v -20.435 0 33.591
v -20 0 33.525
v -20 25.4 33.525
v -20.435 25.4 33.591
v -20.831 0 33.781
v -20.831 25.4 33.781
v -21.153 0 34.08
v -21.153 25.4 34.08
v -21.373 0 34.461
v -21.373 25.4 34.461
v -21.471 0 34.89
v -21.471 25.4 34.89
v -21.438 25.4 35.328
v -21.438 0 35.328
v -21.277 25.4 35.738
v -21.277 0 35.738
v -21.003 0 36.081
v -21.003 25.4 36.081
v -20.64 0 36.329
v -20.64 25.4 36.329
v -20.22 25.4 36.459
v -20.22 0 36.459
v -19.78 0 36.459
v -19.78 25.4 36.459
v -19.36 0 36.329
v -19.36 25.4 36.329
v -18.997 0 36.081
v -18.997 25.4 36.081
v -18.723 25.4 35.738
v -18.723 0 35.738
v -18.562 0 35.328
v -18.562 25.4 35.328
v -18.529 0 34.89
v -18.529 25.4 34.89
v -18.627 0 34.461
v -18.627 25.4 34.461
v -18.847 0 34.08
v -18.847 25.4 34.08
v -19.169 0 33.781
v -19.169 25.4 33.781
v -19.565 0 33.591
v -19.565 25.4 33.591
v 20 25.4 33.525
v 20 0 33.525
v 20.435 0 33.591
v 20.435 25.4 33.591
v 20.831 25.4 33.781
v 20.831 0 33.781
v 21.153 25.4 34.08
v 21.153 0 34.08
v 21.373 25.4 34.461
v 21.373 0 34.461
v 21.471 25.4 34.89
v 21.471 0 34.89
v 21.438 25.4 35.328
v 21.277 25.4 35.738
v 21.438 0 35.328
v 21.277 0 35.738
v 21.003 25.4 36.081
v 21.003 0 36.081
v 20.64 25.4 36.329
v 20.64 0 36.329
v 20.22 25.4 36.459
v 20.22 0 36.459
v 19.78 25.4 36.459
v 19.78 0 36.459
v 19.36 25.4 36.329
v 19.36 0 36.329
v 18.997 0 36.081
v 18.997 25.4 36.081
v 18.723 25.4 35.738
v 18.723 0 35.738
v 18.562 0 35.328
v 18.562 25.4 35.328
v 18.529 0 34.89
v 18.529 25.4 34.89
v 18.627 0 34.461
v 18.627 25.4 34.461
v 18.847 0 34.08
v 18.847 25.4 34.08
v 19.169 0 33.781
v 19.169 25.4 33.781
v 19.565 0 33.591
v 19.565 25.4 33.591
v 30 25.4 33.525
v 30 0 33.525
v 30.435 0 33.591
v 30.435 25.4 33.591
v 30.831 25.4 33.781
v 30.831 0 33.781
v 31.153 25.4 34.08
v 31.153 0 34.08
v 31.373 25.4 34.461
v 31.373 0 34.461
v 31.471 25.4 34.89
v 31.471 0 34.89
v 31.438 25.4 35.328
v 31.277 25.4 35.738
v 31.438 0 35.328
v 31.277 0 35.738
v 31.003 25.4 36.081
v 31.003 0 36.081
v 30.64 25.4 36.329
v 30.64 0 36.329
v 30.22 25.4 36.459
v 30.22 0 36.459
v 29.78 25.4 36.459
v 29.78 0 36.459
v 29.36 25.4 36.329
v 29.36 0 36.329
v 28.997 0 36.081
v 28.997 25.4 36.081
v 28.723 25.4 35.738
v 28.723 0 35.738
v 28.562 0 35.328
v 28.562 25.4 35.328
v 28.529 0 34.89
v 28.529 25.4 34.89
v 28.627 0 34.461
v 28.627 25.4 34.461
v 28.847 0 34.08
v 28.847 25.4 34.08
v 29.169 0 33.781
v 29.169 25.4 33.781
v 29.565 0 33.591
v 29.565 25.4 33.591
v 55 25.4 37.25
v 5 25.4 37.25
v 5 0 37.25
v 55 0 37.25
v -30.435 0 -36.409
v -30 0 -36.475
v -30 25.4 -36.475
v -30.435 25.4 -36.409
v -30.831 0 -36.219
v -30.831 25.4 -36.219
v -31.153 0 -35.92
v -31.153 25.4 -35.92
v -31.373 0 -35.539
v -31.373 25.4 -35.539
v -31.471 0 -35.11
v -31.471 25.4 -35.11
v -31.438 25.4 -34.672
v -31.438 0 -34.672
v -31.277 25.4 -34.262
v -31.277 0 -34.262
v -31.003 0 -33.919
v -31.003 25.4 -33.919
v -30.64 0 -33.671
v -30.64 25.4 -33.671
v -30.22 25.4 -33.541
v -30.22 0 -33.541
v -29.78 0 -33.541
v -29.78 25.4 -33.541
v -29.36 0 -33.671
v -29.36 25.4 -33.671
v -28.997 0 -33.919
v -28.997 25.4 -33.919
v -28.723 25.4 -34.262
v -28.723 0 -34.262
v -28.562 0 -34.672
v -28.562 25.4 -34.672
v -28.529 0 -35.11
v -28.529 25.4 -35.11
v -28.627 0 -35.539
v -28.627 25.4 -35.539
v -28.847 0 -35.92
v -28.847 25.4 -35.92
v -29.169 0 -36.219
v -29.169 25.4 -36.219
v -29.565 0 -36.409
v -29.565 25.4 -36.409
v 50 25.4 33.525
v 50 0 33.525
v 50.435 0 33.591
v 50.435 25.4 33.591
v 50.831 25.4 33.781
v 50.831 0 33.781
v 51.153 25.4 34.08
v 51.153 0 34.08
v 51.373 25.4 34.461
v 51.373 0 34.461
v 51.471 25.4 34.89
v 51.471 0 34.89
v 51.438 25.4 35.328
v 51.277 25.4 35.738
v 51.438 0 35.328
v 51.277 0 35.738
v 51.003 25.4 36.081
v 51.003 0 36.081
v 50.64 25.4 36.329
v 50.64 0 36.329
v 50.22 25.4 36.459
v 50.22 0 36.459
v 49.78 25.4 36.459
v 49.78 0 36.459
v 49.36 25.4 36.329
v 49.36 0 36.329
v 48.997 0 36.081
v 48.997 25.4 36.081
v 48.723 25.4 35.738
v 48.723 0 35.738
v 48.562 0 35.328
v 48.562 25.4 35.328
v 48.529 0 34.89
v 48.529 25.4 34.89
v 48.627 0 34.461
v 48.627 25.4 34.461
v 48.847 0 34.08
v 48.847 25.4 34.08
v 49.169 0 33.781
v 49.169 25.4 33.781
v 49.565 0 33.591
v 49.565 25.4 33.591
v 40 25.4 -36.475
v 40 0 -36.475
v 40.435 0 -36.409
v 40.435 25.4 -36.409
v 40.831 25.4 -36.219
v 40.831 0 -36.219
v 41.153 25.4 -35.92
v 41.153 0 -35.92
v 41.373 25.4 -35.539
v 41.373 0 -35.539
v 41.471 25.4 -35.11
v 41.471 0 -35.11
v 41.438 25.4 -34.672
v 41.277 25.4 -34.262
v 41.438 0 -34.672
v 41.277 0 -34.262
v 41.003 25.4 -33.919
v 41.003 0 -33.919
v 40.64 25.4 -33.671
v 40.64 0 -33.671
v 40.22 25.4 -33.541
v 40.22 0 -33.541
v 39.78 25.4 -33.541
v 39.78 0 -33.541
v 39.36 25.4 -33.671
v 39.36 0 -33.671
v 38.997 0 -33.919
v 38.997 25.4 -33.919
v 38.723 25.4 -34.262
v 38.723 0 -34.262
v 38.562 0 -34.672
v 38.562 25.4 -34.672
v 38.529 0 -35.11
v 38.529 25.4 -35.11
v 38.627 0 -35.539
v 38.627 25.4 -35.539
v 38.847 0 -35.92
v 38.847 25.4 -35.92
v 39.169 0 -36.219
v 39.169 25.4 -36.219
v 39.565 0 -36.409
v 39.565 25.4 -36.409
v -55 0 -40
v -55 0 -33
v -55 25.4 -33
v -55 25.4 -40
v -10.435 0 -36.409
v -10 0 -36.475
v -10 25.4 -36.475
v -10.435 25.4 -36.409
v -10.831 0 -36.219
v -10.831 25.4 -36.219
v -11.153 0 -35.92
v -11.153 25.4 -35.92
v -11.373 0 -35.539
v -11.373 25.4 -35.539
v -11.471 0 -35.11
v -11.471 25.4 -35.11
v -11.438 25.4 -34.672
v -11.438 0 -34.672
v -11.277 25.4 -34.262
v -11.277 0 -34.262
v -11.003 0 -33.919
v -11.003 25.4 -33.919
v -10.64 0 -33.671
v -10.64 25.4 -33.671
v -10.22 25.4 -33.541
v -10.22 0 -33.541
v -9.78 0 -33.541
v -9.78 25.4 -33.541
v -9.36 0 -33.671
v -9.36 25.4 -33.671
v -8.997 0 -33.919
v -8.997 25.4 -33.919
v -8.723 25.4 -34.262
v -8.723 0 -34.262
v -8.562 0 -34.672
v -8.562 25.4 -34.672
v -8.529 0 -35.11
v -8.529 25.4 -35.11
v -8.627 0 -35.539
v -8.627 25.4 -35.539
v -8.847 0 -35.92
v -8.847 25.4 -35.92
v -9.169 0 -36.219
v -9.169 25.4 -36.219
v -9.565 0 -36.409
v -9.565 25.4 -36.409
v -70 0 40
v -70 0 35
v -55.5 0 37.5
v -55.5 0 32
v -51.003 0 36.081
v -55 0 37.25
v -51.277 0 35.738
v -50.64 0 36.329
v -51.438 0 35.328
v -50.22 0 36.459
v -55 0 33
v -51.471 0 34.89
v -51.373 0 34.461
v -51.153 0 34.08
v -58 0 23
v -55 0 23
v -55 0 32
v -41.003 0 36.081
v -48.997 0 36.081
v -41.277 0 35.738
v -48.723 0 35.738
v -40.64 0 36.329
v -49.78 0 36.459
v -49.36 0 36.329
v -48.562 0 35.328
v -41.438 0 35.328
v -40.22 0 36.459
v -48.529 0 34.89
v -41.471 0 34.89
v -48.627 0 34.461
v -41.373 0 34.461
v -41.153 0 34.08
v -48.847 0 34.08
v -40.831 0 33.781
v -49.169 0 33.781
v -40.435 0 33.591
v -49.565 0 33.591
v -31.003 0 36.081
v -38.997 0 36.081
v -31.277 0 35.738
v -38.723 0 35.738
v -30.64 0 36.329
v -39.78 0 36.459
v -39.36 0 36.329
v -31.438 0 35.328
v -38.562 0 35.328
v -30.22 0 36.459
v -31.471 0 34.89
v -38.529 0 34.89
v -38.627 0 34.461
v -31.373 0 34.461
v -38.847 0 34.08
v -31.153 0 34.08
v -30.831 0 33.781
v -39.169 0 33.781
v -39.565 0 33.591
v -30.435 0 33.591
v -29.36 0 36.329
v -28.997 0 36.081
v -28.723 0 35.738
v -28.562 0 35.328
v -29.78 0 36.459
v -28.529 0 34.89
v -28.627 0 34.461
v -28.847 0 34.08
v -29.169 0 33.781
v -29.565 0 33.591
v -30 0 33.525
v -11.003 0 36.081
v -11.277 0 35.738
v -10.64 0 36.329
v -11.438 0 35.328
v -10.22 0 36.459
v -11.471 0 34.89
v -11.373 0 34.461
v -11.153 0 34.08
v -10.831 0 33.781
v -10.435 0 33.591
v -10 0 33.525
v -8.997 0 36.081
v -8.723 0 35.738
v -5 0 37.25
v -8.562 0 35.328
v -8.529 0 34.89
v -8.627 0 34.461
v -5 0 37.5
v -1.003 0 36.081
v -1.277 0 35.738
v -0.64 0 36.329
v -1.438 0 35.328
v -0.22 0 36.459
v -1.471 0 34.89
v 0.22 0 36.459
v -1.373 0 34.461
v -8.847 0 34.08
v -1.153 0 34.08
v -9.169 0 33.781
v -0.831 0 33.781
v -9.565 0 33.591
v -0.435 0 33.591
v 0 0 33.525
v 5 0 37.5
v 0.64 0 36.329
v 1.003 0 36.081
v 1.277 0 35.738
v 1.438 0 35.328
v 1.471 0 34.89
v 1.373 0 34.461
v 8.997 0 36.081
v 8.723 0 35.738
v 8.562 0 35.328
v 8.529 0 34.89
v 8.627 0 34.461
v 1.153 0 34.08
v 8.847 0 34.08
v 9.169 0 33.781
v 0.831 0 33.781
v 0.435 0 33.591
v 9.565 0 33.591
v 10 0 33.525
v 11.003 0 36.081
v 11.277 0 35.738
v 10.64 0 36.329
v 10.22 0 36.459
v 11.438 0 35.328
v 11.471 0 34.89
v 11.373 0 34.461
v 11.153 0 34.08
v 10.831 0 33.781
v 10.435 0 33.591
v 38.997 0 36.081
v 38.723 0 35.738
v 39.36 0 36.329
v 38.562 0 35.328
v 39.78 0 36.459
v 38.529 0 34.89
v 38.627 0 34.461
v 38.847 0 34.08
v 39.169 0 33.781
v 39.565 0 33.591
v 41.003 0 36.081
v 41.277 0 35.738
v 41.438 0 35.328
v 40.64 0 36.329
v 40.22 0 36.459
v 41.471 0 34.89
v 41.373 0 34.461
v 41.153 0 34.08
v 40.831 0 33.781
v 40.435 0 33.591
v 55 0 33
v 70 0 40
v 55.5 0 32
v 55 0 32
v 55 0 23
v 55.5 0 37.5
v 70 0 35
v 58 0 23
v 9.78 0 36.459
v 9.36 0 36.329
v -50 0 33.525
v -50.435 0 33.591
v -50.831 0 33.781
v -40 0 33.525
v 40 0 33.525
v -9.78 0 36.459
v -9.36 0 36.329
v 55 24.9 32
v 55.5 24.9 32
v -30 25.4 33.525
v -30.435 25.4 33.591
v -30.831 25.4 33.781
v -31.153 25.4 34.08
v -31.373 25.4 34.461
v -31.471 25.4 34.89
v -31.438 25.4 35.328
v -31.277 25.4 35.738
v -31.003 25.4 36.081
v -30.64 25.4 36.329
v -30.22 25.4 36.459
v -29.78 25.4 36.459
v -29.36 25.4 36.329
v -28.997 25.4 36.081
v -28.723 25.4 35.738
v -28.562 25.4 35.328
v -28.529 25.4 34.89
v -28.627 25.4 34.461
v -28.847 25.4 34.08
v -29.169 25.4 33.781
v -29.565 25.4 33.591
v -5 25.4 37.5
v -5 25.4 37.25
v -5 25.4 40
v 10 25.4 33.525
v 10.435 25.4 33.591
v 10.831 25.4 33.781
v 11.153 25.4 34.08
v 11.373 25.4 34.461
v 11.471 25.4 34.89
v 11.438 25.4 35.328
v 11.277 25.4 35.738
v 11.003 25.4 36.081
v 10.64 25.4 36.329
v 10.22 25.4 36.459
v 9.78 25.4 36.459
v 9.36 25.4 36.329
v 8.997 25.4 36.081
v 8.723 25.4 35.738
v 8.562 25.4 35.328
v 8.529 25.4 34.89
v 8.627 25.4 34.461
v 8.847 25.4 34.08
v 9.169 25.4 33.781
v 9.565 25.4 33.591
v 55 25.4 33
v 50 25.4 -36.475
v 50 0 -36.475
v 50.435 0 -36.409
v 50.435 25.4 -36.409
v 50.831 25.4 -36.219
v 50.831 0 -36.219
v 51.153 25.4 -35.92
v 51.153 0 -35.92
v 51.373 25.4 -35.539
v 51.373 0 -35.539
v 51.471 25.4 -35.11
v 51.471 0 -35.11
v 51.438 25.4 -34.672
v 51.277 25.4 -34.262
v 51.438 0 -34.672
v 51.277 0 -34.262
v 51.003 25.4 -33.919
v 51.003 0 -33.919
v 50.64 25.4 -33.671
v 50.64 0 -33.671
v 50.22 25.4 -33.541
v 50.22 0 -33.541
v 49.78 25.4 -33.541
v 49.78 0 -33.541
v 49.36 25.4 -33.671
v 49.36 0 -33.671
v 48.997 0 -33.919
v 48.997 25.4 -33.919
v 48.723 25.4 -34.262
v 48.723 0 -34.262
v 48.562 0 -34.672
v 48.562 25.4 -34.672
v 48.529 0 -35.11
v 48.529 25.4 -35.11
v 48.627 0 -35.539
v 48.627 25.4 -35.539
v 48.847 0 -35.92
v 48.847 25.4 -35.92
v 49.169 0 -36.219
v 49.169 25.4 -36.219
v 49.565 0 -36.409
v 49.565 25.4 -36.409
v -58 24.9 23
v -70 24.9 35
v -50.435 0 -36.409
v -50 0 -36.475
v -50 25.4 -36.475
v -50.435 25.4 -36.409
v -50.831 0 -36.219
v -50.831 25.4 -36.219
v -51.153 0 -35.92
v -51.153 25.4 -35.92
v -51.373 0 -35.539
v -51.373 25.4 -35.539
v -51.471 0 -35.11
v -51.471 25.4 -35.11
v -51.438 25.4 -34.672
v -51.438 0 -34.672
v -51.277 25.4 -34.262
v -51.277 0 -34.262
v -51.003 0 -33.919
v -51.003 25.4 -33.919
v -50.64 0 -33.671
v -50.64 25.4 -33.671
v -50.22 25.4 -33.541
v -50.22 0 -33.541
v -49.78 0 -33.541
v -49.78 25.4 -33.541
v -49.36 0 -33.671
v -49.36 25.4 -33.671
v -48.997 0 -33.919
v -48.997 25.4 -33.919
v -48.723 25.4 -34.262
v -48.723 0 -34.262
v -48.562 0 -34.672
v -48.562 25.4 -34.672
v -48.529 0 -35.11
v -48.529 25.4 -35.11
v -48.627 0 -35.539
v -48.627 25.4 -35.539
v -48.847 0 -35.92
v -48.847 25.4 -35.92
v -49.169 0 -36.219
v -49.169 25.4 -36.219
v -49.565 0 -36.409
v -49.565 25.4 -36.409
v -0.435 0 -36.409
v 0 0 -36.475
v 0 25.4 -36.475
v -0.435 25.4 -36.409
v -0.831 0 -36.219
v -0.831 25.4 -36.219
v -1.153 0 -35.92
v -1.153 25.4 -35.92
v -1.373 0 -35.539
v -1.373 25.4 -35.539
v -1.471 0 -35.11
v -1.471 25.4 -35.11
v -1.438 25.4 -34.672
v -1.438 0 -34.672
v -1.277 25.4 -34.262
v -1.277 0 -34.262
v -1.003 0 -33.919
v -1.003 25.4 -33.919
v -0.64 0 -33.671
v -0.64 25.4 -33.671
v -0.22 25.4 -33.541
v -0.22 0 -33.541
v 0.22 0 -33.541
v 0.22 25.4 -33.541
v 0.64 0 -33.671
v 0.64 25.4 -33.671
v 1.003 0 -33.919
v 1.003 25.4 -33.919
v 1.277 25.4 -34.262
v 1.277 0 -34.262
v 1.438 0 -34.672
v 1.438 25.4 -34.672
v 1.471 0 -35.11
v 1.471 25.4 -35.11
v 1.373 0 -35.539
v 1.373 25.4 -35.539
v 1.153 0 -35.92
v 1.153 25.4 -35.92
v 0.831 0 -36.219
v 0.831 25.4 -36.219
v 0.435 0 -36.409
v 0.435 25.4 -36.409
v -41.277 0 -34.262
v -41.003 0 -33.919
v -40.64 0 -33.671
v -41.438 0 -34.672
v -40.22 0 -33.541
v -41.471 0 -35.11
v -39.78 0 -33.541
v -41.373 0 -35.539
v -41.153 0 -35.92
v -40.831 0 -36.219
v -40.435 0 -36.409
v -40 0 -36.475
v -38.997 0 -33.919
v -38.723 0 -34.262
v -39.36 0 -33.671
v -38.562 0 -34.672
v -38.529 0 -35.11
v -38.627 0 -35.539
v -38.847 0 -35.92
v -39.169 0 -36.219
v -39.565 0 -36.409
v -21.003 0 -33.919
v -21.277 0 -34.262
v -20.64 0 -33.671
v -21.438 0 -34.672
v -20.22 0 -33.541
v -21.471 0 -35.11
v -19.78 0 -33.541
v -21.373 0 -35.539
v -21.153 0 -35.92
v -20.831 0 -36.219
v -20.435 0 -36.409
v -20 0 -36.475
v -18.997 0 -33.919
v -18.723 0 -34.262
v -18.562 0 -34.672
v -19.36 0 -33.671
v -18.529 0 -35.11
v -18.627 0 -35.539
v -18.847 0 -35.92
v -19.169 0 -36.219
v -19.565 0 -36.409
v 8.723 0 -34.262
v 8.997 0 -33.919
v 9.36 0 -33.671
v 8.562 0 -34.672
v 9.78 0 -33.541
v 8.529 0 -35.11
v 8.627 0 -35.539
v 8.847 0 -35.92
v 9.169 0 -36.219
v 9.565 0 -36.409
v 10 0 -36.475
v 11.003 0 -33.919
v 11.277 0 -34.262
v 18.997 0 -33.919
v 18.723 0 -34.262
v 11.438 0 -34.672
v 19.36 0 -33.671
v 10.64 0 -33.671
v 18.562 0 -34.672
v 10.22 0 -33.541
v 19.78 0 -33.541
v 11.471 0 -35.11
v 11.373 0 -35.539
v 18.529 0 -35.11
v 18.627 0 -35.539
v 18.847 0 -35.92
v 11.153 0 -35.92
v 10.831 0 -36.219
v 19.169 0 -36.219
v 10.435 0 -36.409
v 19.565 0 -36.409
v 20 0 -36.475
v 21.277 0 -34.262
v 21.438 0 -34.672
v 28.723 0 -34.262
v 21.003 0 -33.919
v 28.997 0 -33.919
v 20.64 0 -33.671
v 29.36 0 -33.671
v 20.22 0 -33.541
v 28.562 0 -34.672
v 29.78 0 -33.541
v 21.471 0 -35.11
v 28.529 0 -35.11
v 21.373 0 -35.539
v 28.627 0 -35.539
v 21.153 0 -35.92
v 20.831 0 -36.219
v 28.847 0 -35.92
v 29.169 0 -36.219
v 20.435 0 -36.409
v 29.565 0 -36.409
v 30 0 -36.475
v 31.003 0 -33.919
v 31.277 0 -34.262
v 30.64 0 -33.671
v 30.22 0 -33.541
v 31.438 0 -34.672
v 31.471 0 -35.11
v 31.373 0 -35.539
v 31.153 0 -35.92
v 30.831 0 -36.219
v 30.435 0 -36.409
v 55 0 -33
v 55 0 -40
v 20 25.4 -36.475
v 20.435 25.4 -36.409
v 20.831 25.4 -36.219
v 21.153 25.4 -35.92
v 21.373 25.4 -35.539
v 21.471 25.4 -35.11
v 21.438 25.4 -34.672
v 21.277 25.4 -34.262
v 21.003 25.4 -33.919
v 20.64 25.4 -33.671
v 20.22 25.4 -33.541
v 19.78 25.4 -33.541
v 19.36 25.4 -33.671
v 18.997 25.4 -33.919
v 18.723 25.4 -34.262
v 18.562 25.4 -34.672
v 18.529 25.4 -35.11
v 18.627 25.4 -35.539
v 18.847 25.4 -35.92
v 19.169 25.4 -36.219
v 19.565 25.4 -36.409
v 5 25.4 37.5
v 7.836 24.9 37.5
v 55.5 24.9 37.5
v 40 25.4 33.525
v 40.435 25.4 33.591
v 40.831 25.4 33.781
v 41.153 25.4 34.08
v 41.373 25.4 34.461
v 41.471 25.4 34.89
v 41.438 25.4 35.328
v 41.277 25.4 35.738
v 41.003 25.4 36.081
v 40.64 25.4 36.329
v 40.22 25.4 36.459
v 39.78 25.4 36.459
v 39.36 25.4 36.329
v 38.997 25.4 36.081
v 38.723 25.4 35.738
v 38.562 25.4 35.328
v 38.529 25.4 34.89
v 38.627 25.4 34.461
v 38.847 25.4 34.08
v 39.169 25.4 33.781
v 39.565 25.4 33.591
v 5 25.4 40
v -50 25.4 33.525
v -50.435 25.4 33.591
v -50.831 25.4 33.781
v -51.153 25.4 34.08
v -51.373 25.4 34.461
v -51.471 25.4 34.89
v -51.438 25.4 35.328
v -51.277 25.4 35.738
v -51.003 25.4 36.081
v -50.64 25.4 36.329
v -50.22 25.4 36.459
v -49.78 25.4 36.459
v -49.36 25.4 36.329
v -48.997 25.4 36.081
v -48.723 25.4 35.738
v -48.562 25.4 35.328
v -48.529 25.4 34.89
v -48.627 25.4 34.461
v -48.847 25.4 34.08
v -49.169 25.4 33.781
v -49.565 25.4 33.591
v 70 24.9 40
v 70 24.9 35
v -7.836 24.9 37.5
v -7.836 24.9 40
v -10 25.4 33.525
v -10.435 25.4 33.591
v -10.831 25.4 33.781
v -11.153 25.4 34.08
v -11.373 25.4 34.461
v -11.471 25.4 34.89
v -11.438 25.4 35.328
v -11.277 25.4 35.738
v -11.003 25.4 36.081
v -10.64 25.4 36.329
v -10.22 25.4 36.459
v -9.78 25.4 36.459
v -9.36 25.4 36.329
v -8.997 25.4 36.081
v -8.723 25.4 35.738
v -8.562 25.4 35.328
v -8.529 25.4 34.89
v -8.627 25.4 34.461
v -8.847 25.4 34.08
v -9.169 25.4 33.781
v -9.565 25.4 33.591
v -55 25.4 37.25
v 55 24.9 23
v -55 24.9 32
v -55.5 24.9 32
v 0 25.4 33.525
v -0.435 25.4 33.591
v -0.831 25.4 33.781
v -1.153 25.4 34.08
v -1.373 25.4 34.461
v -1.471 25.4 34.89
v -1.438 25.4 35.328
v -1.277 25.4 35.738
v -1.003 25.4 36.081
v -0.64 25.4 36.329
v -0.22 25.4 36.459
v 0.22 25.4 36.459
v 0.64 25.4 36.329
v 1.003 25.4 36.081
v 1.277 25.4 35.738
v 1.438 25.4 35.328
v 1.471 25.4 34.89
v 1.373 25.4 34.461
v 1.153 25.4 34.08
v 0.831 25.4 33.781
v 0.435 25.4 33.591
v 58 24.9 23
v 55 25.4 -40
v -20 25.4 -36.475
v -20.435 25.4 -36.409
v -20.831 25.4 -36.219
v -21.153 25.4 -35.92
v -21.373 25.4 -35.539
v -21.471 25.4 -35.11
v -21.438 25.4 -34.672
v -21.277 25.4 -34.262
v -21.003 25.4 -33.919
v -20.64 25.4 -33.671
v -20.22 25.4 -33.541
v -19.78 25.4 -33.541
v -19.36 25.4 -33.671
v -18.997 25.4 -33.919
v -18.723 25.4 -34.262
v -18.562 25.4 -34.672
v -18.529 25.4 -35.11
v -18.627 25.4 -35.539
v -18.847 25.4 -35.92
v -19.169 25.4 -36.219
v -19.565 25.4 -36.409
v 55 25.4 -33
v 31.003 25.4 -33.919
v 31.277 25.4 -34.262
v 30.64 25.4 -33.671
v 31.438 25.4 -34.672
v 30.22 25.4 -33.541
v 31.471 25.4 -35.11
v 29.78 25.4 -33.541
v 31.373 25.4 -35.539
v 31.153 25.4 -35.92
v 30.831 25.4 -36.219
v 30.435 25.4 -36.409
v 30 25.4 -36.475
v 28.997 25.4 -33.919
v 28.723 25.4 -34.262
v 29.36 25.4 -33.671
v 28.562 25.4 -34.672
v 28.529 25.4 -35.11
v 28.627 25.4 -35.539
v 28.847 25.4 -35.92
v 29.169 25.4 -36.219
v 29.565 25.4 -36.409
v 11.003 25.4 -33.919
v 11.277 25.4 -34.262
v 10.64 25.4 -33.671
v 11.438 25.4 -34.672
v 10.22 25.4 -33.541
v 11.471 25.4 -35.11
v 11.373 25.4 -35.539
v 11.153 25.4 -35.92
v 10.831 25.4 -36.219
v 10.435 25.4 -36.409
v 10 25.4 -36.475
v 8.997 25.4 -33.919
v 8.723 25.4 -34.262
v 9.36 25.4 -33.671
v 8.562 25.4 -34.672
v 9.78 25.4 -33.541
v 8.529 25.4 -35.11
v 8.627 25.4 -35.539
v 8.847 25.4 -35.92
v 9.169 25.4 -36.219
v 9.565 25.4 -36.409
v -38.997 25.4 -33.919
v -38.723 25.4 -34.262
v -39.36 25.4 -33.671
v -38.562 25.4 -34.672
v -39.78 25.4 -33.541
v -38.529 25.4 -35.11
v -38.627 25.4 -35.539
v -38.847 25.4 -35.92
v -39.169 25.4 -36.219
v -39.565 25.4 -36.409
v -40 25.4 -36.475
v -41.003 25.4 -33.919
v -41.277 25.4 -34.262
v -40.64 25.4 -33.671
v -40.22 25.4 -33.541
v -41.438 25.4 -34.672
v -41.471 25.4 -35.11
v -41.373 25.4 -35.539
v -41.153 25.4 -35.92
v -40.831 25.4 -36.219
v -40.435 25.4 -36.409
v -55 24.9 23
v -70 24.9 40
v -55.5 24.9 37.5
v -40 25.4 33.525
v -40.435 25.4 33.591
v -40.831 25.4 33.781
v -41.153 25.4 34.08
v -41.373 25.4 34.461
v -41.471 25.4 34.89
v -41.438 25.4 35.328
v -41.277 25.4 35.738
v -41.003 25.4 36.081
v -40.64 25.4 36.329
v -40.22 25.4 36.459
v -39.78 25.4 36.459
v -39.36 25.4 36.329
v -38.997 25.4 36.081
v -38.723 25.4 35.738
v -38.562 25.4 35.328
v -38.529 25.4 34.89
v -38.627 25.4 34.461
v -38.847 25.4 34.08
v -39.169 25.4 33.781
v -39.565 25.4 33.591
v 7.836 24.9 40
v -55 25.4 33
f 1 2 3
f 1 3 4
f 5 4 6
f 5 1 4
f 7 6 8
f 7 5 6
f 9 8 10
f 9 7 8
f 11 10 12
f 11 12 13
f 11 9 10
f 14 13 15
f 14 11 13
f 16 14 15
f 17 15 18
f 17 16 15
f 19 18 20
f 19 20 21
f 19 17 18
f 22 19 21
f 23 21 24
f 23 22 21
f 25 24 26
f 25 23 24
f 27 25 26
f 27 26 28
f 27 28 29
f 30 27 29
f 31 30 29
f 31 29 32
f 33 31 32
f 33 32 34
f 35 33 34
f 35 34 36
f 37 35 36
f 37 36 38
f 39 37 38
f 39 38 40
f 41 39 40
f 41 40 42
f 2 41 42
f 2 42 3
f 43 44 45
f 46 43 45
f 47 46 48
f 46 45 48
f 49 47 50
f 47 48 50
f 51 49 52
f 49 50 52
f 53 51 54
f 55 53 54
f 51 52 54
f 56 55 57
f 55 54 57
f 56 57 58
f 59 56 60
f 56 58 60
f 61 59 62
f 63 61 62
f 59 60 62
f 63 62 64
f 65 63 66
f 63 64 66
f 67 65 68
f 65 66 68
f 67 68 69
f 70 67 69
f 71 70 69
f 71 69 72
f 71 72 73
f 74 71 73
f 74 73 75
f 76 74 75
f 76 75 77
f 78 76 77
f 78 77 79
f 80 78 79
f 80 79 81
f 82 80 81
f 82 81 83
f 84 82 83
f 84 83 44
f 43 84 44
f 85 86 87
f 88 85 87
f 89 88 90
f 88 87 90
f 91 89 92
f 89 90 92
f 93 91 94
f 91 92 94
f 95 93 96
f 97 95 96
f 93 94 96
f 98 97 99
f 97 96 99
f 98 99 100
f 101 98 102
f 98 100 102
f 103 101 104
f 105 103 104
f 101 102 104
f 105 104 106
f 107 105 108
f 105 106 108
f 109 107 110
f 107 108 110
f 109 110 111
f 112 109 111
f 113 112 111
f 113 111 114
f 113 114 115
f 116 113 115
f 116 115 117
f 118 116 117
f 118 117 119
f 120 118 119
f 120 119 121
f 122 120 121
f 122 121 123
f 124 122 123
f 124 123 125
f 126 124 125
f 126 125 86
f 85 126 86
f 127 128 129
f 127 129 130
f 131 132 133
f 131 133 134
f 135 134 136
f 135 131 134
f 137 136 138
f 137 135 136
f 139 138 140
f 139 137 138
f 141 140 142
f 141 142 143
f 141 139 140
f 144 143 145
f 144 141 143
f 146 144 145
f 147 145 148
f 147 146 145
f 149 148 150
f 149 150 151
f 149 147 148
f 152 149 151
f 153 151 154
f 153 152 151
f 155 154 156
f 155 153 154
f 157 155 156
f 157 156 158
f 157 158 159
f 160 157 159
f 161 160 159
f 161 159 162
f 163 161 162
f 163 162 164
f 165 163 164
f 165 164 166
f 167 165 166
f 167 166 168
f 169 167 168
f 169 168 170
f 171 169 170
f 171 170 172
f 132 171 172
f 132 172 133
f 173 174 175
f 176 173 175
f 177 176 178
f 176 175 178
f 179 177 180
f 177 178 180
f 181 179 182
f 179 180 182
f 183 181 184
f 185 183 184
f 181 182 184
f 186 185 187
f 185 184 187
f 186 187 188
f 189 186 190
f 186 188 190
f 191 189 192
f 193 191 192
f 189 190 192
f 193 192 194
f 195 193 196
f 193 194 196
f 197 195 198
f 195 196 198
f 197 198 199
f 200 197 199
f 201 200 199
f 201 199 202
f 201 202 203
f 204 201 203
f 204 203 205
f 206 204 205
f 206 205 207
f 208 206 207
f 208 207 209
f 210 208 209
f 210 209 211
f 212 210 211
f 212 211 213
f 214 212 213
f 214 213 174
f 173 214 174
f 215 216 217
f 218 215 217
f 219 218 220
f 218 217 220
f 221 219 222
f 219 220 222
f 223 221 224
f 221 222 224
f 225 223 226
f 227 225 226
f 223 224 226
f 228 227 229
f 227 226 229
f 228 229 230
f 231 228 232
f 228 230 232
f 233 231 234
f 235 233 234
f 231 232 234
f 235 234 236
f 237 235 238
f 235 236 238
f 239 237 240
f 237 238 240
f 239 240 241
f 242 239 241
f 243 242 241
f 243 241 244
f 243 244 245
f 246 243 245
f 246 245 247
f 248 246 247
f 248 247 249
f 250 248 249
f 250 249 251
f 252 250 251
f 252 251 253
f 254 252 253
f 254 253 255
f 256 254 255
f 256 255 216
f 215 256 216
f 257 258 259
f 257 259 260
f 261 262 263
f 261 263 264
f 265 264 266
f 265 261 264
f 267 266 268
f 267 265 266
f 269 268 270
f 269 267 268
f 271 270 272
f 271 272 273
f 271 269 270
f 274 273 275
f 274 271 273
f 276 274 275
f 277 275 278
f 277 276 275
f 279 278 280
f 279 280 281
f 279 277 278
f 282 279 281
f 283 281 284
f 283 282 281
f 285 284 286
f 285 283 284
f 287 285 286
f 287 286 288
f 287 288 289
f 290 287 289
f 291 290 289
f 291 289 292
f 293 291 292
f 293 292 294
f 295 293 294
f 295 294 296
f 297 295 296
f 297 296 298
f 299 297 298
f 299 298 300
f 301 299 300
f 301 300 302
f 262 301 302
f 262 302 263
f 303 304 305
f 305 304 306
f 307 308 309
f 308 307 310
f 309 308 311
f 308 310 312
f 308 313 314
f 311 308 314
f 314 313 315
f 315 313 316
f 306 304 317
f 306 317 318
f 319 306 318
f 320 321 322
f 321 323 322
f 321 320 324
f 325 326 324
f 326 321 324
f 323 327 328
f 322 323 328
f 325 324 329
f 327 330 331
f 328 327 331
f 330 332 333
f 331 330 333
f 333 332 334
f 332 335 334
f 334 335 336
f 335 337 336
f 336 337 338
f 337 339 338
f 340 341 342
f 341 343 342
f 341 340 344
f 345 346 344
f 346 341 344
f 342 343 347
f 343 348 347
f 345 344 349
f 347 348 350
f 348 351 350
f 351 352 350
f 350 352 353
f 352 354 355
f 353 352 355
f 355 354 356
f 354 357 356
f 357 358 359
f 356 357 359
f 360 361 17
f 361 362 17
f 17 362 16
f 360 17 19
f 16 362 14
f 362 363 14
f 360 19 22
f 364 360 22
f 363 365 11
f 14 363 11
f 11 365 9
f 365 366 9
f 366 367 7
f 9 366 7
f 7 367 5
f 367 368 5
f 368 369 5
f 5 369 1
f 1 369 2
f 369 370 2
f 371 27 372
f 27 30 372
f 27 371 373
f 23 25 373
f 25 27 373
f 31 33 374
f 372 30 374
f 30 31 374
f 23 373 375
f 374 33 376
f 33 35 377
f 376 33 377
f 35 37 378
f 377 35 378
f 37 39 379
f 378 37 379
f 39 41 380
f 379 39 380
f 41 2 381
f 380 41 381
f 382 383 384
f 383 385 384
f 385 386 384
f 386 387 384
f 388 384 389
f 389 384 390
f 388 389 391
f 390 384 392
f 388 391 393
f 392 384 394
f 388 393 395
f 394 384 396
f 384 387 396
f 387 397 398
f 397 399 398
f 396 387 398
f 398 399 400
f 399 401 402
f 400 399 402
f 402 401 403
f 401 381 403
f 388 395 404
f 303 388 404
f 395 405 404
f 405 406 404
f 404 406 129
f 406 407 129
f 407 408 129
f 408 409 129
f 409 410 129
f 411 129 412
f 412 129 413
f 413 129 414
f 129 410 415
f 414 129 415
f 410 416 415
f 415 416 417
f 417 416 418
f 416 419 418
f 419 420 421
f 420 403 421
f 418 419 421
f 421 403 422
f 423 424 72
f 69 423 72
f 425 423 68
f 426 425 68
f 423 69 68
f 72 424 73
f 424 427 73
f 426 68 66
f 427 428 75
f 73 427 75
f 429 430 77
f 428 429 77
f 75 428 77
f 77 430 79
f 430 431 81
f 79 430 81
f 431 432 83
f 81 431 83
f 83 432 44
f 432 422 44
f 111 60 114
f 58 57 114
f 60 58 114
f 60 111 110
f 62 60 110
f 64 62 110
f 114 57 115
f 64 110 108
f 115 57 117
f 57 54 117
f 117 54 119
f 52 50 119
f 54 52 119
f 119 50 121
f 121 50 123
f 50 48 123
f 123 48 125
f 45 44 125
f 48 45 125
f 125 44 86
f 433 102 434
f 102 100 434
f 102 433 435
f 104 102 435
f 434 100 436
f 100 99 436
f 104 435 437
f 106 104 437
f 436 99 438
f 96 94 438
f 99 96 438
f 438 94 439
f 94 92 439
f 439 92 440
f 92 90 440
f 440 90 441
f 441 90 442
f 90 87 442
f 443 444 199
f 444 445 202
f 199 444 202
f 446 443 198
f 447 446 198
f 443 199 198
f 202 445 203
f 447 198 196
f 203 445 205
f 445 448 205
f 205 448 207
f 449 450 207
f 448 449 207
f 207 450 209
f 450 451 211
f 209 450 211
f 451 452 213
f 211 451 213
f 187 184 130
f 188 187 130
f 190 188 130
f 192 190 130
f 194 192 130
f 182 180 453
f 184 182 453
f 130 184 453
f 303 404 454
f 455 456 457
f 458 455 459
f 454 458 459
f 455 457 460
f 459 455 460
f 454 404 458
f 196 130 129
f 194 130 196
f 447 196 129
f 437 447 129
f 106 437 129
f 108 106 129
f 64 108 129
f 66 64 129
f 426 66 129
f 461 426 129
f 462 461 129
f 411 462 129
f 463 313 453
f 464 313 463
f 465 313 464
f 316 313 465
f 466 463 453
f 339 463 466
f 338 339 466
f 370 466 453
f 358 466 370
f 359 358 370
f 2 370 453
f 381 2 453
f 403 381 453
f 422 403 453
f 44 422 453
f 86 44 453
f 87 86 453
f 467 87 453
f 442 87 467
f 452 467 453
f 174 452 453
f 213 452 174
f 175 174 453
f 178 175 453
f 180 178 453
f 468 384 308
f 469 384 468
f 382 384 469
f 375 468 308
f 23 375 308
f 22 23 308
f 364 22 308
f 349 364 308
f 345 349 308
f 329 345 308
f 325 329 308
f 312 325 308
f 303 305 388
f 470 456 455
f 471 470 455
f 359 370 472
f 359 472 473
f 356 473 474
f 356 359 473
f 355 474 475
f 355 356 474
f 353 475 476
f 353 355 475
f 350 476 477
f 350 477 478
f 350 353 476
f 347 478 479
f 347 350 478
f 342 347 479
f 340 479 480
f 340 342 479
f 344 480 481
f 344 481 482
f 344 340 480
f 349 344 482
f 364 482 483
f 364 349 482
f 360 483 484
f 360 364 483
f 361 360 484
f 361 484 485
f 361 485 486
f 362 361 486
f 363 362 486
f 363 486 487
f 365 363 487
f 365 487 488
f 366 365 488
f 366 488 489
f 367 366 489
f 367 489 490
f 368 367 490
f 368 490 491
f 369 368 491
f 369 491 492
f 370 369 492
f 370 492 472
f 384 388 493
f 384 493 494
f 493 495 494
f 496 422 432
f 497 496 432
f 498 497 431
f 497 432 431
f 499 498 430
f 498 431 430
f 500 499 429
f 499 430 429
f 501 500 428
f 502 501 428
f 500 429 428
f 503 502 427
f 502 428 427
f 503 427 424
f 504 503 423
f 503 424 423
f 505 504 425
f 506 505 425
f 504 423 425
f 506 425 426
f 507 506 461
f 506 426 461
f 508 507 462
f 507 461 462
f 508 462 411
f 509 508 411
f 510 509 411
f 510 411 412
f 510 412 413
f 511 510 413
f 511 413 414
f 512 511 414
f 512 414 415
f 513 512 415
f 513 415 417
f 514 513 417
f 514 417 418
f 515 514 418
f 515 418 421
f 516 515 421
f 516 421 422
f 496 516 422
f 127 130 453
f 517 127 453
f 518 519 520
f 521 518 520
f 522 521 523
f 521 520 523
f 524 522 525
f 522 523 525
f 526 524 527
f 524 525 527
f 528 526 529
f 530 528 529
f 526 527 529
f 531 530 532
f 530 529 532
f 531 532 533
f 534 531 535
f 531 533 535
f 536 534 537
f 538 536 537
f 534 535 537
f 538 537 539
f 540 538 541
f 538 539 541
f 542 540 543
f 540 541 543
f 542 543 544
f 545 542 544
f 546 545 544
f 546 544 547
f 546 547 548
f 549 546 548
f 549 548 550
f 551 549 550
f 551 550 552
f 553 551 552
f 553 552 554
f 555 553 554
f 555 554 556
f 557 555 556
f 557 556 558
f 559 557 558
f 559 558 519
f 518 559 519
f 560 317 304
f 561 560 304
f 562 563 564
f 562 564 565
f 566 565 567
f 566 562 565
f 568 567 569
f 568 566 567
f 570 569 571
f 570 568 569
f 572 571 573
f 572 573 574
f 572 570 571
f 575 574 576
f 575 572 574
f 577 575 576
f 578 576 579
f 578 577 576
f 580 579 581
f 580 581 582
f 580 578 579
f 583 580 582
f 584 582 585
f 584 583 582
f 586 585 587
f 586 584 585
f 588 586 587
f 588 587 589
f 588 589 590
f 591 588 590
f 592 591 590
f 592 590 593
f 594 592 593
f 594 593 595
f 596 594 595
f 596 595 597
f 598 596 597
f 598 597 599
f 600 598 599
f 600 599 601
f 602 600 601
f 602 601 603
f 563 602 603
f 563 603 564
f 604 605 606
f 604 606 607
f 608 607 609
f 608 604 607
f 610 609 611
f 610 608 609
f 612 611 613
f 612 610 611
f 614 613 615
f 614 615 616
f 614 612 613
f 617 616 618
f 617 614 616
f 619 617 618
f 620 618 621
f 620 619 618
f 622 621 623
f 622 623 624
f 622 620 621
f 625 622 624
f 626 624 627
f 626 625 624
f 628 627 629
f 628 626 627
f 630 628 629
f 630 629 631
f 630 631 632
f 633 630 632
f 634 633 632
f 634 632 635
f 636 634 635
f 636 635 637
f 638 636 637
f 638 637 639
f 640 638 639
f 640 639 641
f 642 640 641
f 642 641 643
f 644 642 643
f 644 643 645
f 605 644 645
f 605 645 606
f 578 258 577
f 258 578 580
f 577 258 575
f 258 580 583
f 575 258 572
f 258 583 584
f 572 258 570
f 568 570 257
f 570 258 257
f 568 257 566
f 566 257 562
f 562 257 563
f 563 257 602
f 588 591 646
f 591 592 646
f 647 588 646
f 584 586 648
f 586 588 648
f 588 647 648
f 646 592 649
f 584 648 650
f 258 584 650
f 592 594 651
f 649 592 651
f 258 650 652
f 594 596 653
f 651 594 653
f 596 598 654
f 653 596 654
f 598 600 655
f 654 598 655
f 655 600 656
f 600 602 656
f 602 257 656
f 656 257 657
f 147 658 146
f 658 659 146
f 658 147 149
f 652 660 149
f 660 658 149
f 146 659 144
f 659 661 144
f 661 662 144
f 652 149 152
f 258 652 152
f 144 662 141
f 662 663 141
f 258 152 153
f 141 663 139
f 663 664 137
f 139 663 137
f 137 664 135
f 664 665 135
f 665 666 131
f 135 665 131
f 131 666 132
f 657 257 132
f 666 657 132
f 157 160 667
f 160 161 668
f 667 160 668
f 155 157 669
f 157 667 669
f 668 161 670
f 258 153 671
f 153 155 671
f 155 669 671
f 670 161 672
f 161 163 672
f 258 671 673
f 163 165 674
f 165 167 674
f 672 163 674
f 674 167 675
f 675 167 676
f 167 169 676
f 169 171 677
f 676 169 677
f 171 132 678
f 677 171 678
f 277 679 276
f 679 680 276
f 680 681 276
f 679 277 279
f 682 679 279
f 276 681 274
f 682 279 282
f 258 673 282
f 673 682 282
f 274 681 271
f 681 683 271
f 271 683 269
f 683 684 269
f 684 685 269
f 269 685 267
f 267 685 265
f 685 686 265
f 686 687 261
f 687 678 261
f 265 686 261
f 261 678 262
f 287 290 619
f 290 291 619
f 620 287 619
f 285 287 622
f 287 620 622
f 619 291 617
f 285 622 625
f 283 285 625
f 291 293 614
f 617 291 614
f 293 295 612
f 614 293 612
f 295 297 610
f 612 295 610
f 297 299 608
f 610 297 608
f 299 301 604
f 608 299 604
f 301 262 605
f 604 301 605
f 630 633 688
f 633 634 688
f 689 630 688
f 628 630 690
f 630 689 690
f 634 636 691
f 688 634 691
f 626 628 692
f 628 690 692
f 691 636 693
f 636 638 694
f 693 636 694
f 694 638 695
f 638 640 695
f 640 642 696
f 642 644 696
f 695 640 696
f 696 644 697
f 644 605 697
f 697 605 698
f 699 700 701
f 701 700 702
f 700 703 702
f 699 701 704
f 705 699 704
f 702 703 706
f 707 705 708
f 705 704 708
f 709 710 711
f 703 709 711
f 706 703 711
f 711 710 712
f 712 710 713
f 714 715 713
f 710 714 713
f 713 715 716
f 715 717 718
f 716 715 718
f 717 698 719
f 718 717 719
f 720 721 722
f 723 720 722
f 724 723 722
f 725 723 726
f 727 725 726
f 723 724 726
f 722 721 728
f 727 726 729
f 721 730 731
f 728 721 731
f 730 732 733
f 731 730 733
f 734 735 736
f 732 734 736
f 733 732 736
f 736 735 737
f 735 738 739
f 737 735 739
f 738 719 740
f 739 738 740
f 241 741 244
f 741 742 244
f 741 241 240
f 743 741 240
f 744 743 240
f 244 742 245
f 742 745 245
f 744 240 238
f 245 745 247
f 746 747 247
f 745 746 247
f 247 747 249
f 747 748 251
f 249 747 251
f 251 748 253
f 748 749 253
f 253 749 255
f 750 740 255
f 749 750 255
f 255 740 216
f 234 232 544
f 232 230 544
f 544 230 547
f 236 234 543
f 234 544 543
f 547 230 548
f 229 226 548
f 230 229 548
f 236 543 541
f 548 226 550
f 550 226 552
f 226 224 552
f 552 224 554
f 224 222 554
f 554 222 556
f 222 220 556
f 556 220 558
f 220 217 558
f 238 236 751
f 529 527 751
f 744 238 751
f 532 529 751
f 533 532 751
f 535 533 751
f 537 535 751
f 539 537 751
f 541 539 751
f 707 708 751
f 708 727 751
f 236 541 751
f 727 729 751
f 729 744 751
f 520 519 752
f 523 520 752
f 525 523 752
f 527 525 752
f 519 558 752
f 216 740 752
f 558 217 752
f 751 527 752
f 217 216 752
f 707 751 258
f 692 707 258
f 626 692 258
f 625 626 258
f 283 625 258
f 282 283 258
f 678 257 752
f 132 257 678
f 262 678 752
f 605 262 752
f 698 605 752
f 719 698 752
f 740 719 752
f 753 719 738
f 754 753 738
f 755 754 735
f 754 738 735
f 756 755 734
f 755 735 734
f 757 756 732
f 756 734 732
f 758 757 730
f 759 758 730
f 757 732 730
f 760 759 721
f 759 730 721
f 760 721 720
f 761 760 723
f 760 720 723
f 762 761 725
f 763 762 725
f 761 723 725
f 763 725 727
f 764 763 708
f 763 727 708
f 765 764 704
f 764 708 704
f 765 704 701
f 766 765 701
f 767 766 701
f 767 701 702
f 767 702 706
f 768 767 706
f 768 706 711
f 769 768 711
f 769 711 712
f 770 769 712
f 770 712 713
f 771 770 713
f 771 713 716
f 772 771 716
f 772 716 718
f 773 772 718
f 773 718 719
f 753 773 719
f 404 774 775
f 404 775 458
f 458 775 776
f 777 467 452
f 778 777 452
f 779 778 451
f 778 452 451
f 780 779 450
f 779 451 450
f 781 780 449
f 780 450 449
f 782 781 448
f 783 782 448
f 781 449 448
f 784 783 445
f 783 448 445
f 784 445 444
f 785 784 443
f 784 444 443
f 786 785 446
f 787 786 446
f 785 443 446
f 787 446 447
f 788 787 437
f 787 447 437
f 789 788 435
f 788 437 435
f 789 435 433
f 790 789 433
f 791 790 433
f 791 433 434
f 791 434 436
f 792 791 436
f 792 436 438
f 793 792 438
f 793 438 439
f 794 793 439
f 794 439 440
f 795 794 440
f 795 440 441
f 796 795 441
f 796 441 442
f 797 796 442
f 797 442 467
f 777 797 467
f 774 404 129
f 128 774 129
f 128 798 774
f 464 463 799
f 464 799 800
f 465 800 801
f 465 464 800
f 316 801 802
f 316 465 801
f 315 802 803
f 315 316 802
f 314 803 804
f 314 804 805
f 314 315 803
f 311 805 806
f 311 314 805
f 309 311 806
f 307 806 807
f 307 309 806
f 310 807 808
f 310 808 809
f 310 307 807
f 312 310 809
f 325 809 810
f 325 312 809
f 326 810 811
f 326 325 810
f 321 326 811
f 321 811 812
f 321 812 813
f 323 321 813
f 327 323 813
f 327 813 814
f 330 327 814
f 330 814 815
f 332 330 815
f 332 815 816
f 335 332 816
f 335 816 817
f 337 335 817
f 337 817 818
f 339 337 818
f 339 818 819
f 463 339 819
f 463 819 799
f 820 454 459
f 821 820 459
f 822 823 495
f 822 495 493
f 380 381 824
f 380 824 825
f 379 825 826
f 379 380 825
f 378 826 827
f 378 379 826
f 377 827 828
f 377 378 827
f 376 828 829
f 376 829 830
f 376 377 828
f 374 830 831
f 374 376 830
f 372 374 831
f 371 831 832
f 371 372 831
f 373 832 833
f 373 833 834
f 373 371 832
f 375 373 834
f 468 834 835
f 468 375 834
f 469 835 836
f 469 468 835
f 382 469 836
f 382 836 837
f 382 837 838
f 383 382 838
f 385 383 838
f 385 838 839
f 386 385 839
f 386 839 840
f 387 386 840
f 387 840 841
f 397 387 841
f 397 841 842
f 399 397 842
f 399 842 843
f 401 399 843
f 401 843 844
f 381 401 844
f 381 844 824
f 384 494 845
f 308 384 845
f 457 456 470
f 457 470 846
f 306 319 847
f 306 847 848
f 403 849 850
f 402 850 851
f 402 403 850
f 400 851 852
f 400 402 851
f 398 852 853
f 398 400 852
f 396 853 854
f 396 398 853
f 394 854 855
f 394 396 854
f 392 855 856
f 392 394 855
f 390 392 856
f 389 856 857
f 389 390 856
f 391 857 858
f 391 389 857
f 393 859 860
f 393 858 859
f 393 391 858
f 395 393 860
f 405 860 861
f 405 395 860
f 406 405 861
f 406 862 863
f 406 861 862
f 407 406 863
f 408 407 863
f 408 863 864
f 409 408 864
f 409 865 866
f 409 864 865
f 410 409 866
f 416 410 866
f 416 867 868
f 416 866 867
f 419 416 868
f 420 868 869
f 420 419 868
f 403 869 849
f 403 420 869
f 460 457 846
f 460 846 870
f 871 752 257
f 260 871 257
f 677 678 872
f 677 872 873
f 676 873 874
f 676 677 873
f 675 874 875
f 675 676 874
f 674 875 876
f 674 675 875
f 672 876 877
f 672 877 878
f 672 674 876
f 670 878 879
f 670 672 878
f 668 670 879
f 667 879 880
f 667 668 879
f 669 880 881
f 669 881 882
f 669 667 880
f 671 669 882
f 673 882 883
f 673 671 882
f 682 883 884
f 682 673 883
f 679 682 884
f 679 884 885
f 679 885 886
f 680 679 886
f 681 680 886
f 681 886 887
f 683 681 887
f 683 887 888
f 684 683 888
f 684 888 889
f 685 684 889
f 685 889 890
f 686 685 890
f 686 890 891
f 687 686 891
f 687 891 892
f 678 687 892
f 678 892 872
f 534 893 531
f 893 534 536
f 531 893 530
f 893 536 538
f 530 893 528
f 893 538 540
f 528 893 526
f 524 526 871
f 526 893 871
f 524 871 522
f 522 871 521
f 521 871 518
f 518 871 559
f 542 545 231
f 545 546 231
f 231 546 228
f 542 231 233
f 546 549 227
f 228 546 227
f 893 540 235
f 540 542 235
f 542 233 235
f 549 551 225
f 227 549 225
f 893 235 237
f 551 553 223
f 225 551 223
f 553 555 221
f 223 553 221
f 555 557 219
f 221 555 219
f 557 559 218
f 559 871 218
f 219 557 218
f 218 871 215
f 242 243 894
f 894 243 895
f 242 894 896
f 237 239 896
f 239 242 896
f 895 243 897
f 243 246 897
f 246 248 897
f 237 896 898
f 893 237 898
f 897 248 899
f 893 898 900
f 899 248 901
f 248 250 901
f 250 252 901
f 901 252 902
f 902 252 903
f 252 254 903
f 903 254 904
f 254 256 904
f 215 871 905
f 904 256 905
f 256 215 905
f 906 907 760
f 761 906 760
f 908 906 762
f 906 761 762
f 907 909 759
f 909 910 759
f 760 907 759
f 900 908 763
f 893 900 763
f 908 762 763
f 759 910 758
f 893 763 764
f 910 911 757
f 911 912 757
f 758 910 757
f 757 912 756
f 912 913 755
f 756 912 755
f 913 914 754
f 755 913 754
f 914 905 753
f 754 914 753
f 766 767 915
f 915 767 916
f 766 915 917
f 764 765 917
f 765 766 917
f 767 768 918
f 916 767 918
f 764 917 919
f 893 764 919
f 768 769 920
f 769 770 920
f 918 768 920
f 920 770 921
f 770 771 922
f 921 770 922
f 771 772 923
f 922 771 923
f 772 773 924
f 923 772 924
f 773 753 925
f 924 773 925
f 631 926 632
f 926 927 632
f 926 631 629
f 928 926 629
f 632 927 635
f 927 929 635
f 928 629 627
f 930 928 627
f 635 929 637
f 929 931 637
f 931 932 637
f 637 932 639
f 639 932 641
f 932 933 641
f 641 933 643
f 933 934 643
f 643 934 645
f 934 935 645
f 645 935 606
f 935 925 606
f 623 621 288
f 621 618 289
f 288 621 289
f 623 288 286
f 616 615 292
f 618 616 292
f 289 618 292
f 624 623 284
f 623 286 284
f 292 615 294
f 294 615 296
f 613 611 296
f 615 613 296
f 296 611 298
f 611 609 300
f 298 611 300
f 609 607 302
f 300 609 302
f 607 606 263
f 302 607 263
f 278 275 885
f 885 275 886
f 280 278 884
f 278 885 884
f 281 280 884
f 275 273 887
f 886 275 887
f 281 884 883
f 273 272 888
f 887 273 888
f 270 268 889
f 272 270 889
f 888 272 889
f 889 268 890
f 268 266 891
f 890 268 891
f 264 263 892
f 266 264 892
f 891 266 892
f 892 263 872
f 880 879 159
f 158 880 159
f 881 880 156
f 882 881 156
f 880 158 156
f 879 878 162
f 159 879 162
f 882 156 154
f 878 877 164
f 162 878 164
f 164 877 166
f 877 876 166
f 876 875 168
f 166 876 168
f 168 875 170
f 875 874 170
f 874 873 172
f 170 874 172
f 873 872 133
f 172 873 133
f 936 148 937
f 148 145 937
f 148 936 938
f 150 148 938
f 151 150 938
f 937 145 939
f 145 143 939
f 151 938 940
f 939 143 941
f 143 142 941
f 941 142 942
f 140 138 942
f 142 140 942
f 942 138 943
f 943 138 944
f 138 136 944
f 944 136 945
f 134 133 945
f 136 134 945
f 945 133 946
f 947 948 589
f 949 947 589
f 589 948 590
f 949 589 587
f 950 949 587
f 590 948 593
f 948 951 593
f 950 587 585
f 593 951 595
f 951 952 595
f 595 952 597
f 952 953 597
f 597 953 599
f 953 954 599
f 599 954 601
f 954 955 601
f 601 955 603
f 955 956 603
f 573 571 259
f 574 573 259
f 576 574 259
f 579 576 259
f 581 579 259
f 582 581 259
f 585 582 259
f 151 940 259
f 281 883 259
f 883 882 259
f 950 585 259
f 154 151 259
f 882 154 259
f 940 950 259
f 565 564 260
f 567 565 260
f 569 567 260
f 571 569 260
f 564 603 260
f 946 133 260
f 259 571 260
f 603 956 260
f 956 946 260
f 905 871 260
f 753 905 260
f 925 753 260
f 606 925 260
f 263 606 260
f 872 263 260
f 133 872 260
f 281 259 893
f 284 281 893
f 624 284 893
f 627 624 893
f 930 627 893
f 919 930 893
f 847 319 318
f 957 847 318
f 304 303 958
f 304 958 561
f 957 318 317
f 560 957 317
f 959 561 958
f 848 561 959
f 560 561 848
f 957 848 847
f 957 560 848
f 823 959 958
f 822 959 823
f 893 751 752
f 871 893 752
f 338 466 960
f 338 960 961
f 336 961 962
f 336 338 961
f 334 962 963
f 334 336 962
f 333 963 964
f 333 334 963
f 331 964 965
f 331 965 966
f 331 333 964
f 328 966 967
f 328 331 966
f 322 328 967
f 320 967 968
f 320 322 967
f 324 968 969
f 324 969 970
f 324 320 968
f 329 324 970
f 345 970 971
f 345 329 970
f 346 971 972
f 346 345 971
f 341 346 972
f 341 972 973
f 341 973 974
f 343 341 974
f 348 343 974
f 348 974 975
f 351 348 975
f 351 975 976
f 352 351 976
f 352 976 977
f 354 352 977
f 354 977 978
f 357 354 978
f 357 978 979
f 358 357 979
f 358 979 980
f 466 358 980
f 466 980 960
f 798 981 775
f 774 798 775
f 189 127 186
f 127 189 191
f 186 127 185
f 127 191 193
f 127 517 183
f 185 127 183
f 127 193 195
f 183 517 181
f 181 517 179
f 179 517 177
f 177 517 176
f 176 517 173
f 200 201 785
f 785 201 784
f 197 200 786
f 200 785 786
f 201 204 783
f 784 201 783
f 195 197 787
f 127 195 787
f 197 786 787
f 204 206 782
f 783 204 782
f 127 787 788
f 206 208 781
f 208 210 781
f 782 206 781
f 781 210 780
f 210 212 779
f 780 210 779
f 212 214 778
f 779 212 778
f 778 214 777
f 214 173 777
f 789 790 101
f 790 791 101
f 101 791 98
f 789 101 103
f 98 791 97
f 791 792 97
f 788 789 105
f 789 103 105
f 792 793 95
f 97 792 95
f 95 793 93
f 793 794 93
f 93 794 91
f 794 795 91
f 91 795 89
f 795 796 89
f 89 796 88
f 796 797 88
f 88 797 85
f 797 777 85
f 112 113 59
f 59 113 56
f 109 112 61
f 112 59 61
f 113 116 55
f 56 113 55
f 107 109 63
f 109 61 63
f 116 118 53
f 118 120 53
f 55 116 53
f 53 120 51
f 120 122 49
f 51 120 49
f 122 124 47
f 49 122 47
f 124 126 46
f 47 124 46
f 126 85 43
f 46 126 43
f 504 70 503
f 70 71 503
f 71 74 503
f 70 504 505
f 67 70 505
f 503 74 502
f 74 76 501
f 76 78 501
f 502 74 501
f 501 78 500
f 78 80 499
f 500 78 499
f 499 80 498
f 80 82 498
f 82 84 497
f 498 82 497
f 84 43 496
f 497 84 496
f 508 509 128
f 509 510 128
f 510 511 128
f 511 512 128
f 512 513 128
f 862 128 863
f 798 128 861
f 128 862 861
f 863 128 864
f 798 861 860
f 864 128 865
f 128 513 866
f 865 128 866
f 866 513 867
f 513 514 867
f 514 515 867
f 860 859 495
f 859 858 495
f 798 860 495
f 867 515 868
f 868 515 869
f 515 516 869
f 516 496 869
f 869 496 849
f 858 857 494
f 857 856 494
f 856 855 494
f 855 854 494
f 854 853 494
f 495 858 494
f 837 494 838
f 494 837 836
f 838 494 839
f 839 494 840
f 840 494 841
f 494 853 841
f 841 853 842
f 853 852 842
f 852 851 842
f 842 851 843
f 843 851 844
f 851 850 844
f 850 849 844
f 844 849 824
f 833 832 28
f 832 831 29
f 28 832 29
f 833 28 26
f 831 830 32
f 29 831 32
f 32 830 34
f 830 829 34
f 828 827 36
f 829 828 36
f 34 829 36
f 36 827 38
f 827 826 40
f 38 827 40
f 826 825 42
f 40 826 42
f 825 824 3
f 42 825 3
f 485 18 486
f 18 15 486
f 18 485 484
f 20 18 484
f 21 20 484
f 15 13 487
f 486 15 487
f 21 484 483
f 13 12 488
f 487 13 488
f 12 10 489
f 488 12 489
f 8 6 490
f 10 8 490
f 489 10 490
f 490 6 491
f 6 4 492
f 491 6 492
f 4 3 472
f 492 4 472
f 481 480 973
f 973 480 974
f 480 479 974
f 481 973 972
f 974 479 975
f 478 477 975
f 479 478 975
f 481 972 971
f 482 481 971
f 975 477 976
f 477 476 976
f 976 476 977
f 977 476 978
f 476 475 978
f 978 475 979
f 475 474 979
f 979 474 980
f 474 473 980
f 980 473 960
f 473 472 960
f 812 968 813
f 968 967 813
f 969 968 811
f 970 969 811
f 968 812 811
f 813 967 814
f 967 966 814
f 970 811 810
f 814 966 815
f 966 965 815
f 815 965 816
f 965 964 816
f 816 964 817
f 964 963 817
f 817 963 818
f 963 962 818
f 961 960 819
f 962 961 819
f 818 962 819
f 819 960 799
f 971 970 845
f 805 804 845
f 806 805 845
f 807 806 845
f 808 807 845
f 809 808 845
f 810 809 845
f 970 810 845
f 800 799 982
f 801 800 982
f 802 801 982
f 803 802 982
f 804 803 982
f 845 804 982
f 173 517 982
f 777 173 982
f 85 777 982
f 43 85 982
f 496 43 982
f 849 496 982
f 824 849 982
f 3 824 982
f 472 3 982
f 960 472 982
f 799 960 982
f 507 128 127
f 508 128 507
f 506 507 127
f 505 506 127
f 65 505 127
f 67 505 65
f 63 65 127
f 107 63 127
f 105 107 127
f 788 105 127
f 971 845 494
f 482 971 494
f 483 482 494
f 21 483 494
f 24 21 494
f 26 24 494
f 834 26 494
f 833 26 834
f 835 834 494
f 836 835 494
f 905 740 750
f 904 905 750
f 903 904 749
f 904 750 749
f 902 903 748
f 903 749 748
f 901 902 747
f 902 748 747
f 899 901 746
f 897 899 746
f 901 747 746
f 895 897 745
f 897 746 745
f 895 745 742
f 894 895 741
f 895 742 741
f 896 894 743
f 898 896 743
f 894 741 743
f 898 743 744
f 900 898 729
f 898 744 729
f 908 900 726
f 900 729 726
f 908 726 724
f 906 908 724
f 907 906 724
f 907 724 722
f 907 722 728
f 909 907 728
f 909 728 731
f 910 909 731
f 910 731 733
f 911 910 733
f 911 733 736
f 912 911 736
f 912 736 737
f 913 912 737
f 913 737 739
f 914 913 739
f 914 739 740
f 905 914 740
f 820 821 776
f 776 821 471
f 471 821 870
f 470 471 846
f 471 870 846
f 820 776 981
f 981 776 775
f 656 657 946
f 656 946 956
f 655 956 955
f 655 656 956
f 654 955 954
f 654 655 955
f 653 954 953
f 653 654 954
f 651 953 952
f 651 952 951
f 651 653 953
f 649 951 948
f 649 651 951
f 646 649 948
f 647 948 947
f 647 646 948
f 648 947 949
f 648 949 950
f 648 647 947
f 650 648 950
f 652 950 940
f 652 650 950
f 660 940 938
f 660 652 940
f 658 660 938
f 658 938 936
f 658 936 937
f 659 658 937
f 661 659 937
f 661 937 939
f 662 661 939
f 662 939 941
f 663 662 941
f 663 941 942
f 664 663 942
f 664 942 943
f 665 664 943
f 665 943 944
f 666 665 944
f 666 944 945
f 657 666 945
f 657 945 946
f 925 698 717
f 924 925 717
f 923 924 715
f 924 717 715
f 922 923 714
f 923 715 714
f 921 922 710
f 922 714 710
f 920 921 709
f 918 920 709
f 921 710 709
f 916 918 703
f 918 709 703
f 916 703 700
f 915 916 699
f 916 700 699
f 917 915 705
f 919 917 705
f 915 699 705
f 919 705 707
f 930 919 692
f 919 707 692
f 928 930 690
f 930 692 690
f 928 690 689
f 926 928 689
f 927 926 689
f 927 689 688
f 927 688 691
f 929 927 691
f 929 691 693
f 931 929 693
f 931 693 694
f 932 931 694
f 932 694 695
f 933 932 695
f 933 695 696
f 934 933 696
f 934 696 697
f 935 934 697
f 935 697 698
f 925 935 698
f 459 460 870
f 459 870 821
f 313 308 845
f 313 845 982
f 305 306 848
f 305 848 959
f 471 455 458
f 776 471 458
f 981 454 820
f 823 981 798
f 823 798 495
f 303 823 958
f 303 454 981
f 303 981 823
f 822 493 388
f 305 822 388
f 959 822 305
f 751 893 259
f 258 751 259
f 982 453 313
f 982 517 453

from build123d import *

# Parameters (mm, degrees)
SKETCH1_W           = 110
SKETCH1_H           = 80
BOSS_EXTRUDE1_DEPTH = 25.4
SKETCH2_W           = 66
SKETCH2_H           = 24
CUT_EXTRUDE1_DEPTH  = 120.771282034
SKETCH3_R           = 1.475
CUT_EXTRUDE2_DEPTH  = 73.595867651
LPATTERN1_COUNT     = 6
LPATTERN1_PITCH     = 10
LPATTERN1_COL_COUNT = 6
LPATTERN1_COL_PITCH = 10
BOSS_EXTRUDE2_DEPTH = 24.9
SKETCH11_W          = 10
SKETCH11_H          = 66
CUT_EXTRUDE7_DEPTH  = 75.431176264
SKETCH12_W          = 0.5
SKETCH12_H          = 9
BOSS_EXTRUDE5_DEPTH = 24.9
SKETCH5_W           = 50
SKETCH5_H           = 0.25
CUT_EXTRUDE3_DEPTH  = 75.894325553
SKETCH6_W           = 50
SKETCH6_H           = 2.5
CUT_EXTRUDE4_DEPTH  = 0.5
SKETCH7_W           = 12
SKETCH7_H           = 5
BOSS_EXTRUDE3_DEPTH = 24.9
BOSS_EXTRUDE4_DEPTH = 24.9
CHAMFER1_SIZE2      = 2.83564091
CHAMFER1_SIZE       = 0.5
SKETCH9_W           = 55
SKETCH9_H           = 80
CUT_EXTRUDE5_DEPTH  = 85.529048262
SKETCH10_W          = 90
SKETCH10_H          = 66
CUT_EXTRUDE6_DEPTH  = 85.118963379


with BuildPart() as part:
    # Sketch1 → Boss-Extrude1 (new body)
    with BuildSketch(Plane(origin=(0, 0, 0), x_dir=(1, 0, 0), z_dir=(0, 1, 0))):
        Rectangle(SKETCH1_W, SKETCH1_H)
    extrude(amount=BOSS_EXTRUDE1_DEPTH)

    # Sketch2 → Cut-Extrude1 (cut, through all)
    with BuildSketch(Plane(origin=(55, 0, 0), x_dir=(0, 0, -1), z_dir=(1, 0, 0))):
        with Locations((0, 13.4)):
            Rectangle(SKETCH2_W, SKETCH2_H)
    extrude(amount=-CUT_EXTRUDE1_DEPTH, mode=Mode.SUBTRACT)

    # Sketch3 → Cut-Extrude2 (cut, through all)
    with BuildSketch(Plane.XZ):
        with Locations(Location((0, 35, 0), (0, 0, 270))):
            Circle(SKETCH3_R)
        with Locations(Location((0, -35, 0), (0, 0, 270))):
            Circle(SKETCH3_R)
    cut_extrude2 = extrude(amount=-CUT_EXTRUDE2_DEPTH, mode=Mode.SUBTRACT)

    # LPattern1: Cut-Extrude2 ×6
    with Locations(*[(i * LPATTERN1_PITCH, 0, 0) for i in range(1, LPATTERN1_COUNT)]):
        add(cut_extrude2, mode=Mode.SUBTRACT)

    # LPattern1 col: Cut-Extrude2 ×6
    with Locations(*[(-i * LPATTERN1_COL_PITCH, 0, 0) for i in range(1, LPATTERN1_COL_COUNT)]):
        add(cut_extrude2, mode=Mode.SUBTRACT)

    # Sketch4 → Boss-Extrude2 (add)
    with BuildSketch(Plane(origin=(0, 0, 0), x_dir=(1, 0, 0), z_dir=(0, 1, 0))):
        Polygon((55, -40), (58, -40), (58, -37.5), (58, -23), (55.5, -23), (55.5, -37.5), (55, -37.5), align=None)
    extrude(amount=BOSS_EXTRUDE2_DEPTH)

    # Sketch11 → Cut-Extrude7 (cut, through all)
    with BuildSketch(Plane(origin=(0, 1.4, 0), x_dir=(1, 0, 0), z_dir=(0, 1, 0))):
        with Locations((50, 0)):
            Rectangle(SKETCH11_W, SKETCH11_H)
    extrude(amount=-CUT_EXTRUDE7_DEPTH, mode=Mode.SUBTRACT)

    # Sketch12 → Boss-Extrude5 (add)
    with BuildSketch(Plane(origin=(0, 0, 0), x_dir=(1, 0, 0), z_dir=(0, 1, 0))):
        with Locations((55.25, -27.5)):
            Rectangle(SKETCH12_W, SKETCH12_H)
    extrude(amount=BOSS_EXTRUDE5_DEPTH)

    # Sketch5 → Cut-Extrude3 (cut, through all)
    with BuildSketch(Plane(origin=(0, 25.4, 0), x_dir=(1, 0, 0), z_dir=(0, 1, 0))):
        with Locations((30, -37.375)):
            Rectangle(SKETCH5_W, SKETCH5_H)
    extrude(amount=-CUT_EXTRUDE3_DEPTH, mode=Mode.SUBTRACT)

    # Sketch6 → Cut-Extrude4 (cut)
    with BuildSketch(Plane(origin=(0, 25.4, 0), x_dir=(1, 0, 0), z_dir=(0, 1, 0))):
        with Locations((30, -38.75)):
            Rectangle(SKETCH6_W, SKETCH6_H)
    extrude(amount=-CUT_EXTRUDE4_DEPTH, mode=Mode.SUBTRACT)

    # Sketch7 → Boss-Extrude3 (add)
    with BuildSketch(Plane(origin=(0, 0, 0), x_dir=(1, 0, 0), z_dir=(0, 1, 0))):
        with Locations((64, -37.5)):
            Rectangle(SKETCH7_W, SKETCH7_H)
    extrude(amount=BOSS_EXTRUDE3_DEPTH)

    # Sketch8 → Boss-Extrude4 (add)
    with BuildSketch(Plane(origin=(0, 0, 0), x_dir=(1, 0, 0), z_dir=(0, 1, 0))):
        Polygon((58, -23), (70, -35), (58, -35), align=None)
    extrude(amount=BOSS_EXTRUDE4_DEPTH)

    # Chamfer1
    chamfer1_edges = [part.edges().sort_by_distance(p)[0] for p in [
        (5, 24.9, 38.75),
    ]]
    chamfer1_side = [part.faces().sort_by_distance(p)[0] for p in [
        (5, 24.91, 38.75),
    ]]
    chamfer(chamfer1_edges, length=CHAMFER1_SIZE - 0.0001, length2=CHAMFER1_SIZE2 - 0.0001, reference=chamfer1_side[0])  # a hair under: the kernel refuses the full size

    # Sketch9 → Cut-Extrude5 (cut, through all)
    with BuildSketch(Plane(origin=(0, 25.4, 0), x_dir=(1, 0, 0), z_dir=(0, 1, 0))):
        with Locations((-27.5, 0)):
            Rectangle(SKETCH9_W, SKETCH9_H)
    extrude(amount=-CUT_EXTRUDE5_DEPTH, mode=Mode.SUBTRACT)

    # Mirror1: part across plane


with BuildPart() as part_1:
    add(part.part)
    add(part.part.mirror(Plane(origin=(0, 0, -40), x_dir=(0, 0, 1), z_dir=(1, 0, 0))))

    # Sketch10 → Cut-Extrude6 (cut, through all)
    with BuildSketch(Plane(origin=(0, 1.4, 0), x_dir=(1, 0, 0), z_dir=(0, 1, 0))):
        Rectangle(SKETCH10_W, SKETCH10_H)
    extrude(amount=-CUT_EXTRUDE6_DEPTH, mode=Mode.SUBTRACT)


with BuildPart() as cut_extrude6_piece_1:
    # of the separate pieces the step leaves, piece 1, a body of its own (cut_extrude6_pieces)
    add(part_1.part.solids().sort_by_distance((5, 25.3999, 40))[0])


with BuildPart() as cut_extrude6_piece_2:
    # of the separate pieces the step leaves, piece 2, a body of its own (cut_extrude6_pieces)
    add(part_1.part.solids().sort_by_distance((55, 0, -33))[0])


solid = Compound([cut_extrude6_piece_1.part, cut_extrude6_piece_2.part])
